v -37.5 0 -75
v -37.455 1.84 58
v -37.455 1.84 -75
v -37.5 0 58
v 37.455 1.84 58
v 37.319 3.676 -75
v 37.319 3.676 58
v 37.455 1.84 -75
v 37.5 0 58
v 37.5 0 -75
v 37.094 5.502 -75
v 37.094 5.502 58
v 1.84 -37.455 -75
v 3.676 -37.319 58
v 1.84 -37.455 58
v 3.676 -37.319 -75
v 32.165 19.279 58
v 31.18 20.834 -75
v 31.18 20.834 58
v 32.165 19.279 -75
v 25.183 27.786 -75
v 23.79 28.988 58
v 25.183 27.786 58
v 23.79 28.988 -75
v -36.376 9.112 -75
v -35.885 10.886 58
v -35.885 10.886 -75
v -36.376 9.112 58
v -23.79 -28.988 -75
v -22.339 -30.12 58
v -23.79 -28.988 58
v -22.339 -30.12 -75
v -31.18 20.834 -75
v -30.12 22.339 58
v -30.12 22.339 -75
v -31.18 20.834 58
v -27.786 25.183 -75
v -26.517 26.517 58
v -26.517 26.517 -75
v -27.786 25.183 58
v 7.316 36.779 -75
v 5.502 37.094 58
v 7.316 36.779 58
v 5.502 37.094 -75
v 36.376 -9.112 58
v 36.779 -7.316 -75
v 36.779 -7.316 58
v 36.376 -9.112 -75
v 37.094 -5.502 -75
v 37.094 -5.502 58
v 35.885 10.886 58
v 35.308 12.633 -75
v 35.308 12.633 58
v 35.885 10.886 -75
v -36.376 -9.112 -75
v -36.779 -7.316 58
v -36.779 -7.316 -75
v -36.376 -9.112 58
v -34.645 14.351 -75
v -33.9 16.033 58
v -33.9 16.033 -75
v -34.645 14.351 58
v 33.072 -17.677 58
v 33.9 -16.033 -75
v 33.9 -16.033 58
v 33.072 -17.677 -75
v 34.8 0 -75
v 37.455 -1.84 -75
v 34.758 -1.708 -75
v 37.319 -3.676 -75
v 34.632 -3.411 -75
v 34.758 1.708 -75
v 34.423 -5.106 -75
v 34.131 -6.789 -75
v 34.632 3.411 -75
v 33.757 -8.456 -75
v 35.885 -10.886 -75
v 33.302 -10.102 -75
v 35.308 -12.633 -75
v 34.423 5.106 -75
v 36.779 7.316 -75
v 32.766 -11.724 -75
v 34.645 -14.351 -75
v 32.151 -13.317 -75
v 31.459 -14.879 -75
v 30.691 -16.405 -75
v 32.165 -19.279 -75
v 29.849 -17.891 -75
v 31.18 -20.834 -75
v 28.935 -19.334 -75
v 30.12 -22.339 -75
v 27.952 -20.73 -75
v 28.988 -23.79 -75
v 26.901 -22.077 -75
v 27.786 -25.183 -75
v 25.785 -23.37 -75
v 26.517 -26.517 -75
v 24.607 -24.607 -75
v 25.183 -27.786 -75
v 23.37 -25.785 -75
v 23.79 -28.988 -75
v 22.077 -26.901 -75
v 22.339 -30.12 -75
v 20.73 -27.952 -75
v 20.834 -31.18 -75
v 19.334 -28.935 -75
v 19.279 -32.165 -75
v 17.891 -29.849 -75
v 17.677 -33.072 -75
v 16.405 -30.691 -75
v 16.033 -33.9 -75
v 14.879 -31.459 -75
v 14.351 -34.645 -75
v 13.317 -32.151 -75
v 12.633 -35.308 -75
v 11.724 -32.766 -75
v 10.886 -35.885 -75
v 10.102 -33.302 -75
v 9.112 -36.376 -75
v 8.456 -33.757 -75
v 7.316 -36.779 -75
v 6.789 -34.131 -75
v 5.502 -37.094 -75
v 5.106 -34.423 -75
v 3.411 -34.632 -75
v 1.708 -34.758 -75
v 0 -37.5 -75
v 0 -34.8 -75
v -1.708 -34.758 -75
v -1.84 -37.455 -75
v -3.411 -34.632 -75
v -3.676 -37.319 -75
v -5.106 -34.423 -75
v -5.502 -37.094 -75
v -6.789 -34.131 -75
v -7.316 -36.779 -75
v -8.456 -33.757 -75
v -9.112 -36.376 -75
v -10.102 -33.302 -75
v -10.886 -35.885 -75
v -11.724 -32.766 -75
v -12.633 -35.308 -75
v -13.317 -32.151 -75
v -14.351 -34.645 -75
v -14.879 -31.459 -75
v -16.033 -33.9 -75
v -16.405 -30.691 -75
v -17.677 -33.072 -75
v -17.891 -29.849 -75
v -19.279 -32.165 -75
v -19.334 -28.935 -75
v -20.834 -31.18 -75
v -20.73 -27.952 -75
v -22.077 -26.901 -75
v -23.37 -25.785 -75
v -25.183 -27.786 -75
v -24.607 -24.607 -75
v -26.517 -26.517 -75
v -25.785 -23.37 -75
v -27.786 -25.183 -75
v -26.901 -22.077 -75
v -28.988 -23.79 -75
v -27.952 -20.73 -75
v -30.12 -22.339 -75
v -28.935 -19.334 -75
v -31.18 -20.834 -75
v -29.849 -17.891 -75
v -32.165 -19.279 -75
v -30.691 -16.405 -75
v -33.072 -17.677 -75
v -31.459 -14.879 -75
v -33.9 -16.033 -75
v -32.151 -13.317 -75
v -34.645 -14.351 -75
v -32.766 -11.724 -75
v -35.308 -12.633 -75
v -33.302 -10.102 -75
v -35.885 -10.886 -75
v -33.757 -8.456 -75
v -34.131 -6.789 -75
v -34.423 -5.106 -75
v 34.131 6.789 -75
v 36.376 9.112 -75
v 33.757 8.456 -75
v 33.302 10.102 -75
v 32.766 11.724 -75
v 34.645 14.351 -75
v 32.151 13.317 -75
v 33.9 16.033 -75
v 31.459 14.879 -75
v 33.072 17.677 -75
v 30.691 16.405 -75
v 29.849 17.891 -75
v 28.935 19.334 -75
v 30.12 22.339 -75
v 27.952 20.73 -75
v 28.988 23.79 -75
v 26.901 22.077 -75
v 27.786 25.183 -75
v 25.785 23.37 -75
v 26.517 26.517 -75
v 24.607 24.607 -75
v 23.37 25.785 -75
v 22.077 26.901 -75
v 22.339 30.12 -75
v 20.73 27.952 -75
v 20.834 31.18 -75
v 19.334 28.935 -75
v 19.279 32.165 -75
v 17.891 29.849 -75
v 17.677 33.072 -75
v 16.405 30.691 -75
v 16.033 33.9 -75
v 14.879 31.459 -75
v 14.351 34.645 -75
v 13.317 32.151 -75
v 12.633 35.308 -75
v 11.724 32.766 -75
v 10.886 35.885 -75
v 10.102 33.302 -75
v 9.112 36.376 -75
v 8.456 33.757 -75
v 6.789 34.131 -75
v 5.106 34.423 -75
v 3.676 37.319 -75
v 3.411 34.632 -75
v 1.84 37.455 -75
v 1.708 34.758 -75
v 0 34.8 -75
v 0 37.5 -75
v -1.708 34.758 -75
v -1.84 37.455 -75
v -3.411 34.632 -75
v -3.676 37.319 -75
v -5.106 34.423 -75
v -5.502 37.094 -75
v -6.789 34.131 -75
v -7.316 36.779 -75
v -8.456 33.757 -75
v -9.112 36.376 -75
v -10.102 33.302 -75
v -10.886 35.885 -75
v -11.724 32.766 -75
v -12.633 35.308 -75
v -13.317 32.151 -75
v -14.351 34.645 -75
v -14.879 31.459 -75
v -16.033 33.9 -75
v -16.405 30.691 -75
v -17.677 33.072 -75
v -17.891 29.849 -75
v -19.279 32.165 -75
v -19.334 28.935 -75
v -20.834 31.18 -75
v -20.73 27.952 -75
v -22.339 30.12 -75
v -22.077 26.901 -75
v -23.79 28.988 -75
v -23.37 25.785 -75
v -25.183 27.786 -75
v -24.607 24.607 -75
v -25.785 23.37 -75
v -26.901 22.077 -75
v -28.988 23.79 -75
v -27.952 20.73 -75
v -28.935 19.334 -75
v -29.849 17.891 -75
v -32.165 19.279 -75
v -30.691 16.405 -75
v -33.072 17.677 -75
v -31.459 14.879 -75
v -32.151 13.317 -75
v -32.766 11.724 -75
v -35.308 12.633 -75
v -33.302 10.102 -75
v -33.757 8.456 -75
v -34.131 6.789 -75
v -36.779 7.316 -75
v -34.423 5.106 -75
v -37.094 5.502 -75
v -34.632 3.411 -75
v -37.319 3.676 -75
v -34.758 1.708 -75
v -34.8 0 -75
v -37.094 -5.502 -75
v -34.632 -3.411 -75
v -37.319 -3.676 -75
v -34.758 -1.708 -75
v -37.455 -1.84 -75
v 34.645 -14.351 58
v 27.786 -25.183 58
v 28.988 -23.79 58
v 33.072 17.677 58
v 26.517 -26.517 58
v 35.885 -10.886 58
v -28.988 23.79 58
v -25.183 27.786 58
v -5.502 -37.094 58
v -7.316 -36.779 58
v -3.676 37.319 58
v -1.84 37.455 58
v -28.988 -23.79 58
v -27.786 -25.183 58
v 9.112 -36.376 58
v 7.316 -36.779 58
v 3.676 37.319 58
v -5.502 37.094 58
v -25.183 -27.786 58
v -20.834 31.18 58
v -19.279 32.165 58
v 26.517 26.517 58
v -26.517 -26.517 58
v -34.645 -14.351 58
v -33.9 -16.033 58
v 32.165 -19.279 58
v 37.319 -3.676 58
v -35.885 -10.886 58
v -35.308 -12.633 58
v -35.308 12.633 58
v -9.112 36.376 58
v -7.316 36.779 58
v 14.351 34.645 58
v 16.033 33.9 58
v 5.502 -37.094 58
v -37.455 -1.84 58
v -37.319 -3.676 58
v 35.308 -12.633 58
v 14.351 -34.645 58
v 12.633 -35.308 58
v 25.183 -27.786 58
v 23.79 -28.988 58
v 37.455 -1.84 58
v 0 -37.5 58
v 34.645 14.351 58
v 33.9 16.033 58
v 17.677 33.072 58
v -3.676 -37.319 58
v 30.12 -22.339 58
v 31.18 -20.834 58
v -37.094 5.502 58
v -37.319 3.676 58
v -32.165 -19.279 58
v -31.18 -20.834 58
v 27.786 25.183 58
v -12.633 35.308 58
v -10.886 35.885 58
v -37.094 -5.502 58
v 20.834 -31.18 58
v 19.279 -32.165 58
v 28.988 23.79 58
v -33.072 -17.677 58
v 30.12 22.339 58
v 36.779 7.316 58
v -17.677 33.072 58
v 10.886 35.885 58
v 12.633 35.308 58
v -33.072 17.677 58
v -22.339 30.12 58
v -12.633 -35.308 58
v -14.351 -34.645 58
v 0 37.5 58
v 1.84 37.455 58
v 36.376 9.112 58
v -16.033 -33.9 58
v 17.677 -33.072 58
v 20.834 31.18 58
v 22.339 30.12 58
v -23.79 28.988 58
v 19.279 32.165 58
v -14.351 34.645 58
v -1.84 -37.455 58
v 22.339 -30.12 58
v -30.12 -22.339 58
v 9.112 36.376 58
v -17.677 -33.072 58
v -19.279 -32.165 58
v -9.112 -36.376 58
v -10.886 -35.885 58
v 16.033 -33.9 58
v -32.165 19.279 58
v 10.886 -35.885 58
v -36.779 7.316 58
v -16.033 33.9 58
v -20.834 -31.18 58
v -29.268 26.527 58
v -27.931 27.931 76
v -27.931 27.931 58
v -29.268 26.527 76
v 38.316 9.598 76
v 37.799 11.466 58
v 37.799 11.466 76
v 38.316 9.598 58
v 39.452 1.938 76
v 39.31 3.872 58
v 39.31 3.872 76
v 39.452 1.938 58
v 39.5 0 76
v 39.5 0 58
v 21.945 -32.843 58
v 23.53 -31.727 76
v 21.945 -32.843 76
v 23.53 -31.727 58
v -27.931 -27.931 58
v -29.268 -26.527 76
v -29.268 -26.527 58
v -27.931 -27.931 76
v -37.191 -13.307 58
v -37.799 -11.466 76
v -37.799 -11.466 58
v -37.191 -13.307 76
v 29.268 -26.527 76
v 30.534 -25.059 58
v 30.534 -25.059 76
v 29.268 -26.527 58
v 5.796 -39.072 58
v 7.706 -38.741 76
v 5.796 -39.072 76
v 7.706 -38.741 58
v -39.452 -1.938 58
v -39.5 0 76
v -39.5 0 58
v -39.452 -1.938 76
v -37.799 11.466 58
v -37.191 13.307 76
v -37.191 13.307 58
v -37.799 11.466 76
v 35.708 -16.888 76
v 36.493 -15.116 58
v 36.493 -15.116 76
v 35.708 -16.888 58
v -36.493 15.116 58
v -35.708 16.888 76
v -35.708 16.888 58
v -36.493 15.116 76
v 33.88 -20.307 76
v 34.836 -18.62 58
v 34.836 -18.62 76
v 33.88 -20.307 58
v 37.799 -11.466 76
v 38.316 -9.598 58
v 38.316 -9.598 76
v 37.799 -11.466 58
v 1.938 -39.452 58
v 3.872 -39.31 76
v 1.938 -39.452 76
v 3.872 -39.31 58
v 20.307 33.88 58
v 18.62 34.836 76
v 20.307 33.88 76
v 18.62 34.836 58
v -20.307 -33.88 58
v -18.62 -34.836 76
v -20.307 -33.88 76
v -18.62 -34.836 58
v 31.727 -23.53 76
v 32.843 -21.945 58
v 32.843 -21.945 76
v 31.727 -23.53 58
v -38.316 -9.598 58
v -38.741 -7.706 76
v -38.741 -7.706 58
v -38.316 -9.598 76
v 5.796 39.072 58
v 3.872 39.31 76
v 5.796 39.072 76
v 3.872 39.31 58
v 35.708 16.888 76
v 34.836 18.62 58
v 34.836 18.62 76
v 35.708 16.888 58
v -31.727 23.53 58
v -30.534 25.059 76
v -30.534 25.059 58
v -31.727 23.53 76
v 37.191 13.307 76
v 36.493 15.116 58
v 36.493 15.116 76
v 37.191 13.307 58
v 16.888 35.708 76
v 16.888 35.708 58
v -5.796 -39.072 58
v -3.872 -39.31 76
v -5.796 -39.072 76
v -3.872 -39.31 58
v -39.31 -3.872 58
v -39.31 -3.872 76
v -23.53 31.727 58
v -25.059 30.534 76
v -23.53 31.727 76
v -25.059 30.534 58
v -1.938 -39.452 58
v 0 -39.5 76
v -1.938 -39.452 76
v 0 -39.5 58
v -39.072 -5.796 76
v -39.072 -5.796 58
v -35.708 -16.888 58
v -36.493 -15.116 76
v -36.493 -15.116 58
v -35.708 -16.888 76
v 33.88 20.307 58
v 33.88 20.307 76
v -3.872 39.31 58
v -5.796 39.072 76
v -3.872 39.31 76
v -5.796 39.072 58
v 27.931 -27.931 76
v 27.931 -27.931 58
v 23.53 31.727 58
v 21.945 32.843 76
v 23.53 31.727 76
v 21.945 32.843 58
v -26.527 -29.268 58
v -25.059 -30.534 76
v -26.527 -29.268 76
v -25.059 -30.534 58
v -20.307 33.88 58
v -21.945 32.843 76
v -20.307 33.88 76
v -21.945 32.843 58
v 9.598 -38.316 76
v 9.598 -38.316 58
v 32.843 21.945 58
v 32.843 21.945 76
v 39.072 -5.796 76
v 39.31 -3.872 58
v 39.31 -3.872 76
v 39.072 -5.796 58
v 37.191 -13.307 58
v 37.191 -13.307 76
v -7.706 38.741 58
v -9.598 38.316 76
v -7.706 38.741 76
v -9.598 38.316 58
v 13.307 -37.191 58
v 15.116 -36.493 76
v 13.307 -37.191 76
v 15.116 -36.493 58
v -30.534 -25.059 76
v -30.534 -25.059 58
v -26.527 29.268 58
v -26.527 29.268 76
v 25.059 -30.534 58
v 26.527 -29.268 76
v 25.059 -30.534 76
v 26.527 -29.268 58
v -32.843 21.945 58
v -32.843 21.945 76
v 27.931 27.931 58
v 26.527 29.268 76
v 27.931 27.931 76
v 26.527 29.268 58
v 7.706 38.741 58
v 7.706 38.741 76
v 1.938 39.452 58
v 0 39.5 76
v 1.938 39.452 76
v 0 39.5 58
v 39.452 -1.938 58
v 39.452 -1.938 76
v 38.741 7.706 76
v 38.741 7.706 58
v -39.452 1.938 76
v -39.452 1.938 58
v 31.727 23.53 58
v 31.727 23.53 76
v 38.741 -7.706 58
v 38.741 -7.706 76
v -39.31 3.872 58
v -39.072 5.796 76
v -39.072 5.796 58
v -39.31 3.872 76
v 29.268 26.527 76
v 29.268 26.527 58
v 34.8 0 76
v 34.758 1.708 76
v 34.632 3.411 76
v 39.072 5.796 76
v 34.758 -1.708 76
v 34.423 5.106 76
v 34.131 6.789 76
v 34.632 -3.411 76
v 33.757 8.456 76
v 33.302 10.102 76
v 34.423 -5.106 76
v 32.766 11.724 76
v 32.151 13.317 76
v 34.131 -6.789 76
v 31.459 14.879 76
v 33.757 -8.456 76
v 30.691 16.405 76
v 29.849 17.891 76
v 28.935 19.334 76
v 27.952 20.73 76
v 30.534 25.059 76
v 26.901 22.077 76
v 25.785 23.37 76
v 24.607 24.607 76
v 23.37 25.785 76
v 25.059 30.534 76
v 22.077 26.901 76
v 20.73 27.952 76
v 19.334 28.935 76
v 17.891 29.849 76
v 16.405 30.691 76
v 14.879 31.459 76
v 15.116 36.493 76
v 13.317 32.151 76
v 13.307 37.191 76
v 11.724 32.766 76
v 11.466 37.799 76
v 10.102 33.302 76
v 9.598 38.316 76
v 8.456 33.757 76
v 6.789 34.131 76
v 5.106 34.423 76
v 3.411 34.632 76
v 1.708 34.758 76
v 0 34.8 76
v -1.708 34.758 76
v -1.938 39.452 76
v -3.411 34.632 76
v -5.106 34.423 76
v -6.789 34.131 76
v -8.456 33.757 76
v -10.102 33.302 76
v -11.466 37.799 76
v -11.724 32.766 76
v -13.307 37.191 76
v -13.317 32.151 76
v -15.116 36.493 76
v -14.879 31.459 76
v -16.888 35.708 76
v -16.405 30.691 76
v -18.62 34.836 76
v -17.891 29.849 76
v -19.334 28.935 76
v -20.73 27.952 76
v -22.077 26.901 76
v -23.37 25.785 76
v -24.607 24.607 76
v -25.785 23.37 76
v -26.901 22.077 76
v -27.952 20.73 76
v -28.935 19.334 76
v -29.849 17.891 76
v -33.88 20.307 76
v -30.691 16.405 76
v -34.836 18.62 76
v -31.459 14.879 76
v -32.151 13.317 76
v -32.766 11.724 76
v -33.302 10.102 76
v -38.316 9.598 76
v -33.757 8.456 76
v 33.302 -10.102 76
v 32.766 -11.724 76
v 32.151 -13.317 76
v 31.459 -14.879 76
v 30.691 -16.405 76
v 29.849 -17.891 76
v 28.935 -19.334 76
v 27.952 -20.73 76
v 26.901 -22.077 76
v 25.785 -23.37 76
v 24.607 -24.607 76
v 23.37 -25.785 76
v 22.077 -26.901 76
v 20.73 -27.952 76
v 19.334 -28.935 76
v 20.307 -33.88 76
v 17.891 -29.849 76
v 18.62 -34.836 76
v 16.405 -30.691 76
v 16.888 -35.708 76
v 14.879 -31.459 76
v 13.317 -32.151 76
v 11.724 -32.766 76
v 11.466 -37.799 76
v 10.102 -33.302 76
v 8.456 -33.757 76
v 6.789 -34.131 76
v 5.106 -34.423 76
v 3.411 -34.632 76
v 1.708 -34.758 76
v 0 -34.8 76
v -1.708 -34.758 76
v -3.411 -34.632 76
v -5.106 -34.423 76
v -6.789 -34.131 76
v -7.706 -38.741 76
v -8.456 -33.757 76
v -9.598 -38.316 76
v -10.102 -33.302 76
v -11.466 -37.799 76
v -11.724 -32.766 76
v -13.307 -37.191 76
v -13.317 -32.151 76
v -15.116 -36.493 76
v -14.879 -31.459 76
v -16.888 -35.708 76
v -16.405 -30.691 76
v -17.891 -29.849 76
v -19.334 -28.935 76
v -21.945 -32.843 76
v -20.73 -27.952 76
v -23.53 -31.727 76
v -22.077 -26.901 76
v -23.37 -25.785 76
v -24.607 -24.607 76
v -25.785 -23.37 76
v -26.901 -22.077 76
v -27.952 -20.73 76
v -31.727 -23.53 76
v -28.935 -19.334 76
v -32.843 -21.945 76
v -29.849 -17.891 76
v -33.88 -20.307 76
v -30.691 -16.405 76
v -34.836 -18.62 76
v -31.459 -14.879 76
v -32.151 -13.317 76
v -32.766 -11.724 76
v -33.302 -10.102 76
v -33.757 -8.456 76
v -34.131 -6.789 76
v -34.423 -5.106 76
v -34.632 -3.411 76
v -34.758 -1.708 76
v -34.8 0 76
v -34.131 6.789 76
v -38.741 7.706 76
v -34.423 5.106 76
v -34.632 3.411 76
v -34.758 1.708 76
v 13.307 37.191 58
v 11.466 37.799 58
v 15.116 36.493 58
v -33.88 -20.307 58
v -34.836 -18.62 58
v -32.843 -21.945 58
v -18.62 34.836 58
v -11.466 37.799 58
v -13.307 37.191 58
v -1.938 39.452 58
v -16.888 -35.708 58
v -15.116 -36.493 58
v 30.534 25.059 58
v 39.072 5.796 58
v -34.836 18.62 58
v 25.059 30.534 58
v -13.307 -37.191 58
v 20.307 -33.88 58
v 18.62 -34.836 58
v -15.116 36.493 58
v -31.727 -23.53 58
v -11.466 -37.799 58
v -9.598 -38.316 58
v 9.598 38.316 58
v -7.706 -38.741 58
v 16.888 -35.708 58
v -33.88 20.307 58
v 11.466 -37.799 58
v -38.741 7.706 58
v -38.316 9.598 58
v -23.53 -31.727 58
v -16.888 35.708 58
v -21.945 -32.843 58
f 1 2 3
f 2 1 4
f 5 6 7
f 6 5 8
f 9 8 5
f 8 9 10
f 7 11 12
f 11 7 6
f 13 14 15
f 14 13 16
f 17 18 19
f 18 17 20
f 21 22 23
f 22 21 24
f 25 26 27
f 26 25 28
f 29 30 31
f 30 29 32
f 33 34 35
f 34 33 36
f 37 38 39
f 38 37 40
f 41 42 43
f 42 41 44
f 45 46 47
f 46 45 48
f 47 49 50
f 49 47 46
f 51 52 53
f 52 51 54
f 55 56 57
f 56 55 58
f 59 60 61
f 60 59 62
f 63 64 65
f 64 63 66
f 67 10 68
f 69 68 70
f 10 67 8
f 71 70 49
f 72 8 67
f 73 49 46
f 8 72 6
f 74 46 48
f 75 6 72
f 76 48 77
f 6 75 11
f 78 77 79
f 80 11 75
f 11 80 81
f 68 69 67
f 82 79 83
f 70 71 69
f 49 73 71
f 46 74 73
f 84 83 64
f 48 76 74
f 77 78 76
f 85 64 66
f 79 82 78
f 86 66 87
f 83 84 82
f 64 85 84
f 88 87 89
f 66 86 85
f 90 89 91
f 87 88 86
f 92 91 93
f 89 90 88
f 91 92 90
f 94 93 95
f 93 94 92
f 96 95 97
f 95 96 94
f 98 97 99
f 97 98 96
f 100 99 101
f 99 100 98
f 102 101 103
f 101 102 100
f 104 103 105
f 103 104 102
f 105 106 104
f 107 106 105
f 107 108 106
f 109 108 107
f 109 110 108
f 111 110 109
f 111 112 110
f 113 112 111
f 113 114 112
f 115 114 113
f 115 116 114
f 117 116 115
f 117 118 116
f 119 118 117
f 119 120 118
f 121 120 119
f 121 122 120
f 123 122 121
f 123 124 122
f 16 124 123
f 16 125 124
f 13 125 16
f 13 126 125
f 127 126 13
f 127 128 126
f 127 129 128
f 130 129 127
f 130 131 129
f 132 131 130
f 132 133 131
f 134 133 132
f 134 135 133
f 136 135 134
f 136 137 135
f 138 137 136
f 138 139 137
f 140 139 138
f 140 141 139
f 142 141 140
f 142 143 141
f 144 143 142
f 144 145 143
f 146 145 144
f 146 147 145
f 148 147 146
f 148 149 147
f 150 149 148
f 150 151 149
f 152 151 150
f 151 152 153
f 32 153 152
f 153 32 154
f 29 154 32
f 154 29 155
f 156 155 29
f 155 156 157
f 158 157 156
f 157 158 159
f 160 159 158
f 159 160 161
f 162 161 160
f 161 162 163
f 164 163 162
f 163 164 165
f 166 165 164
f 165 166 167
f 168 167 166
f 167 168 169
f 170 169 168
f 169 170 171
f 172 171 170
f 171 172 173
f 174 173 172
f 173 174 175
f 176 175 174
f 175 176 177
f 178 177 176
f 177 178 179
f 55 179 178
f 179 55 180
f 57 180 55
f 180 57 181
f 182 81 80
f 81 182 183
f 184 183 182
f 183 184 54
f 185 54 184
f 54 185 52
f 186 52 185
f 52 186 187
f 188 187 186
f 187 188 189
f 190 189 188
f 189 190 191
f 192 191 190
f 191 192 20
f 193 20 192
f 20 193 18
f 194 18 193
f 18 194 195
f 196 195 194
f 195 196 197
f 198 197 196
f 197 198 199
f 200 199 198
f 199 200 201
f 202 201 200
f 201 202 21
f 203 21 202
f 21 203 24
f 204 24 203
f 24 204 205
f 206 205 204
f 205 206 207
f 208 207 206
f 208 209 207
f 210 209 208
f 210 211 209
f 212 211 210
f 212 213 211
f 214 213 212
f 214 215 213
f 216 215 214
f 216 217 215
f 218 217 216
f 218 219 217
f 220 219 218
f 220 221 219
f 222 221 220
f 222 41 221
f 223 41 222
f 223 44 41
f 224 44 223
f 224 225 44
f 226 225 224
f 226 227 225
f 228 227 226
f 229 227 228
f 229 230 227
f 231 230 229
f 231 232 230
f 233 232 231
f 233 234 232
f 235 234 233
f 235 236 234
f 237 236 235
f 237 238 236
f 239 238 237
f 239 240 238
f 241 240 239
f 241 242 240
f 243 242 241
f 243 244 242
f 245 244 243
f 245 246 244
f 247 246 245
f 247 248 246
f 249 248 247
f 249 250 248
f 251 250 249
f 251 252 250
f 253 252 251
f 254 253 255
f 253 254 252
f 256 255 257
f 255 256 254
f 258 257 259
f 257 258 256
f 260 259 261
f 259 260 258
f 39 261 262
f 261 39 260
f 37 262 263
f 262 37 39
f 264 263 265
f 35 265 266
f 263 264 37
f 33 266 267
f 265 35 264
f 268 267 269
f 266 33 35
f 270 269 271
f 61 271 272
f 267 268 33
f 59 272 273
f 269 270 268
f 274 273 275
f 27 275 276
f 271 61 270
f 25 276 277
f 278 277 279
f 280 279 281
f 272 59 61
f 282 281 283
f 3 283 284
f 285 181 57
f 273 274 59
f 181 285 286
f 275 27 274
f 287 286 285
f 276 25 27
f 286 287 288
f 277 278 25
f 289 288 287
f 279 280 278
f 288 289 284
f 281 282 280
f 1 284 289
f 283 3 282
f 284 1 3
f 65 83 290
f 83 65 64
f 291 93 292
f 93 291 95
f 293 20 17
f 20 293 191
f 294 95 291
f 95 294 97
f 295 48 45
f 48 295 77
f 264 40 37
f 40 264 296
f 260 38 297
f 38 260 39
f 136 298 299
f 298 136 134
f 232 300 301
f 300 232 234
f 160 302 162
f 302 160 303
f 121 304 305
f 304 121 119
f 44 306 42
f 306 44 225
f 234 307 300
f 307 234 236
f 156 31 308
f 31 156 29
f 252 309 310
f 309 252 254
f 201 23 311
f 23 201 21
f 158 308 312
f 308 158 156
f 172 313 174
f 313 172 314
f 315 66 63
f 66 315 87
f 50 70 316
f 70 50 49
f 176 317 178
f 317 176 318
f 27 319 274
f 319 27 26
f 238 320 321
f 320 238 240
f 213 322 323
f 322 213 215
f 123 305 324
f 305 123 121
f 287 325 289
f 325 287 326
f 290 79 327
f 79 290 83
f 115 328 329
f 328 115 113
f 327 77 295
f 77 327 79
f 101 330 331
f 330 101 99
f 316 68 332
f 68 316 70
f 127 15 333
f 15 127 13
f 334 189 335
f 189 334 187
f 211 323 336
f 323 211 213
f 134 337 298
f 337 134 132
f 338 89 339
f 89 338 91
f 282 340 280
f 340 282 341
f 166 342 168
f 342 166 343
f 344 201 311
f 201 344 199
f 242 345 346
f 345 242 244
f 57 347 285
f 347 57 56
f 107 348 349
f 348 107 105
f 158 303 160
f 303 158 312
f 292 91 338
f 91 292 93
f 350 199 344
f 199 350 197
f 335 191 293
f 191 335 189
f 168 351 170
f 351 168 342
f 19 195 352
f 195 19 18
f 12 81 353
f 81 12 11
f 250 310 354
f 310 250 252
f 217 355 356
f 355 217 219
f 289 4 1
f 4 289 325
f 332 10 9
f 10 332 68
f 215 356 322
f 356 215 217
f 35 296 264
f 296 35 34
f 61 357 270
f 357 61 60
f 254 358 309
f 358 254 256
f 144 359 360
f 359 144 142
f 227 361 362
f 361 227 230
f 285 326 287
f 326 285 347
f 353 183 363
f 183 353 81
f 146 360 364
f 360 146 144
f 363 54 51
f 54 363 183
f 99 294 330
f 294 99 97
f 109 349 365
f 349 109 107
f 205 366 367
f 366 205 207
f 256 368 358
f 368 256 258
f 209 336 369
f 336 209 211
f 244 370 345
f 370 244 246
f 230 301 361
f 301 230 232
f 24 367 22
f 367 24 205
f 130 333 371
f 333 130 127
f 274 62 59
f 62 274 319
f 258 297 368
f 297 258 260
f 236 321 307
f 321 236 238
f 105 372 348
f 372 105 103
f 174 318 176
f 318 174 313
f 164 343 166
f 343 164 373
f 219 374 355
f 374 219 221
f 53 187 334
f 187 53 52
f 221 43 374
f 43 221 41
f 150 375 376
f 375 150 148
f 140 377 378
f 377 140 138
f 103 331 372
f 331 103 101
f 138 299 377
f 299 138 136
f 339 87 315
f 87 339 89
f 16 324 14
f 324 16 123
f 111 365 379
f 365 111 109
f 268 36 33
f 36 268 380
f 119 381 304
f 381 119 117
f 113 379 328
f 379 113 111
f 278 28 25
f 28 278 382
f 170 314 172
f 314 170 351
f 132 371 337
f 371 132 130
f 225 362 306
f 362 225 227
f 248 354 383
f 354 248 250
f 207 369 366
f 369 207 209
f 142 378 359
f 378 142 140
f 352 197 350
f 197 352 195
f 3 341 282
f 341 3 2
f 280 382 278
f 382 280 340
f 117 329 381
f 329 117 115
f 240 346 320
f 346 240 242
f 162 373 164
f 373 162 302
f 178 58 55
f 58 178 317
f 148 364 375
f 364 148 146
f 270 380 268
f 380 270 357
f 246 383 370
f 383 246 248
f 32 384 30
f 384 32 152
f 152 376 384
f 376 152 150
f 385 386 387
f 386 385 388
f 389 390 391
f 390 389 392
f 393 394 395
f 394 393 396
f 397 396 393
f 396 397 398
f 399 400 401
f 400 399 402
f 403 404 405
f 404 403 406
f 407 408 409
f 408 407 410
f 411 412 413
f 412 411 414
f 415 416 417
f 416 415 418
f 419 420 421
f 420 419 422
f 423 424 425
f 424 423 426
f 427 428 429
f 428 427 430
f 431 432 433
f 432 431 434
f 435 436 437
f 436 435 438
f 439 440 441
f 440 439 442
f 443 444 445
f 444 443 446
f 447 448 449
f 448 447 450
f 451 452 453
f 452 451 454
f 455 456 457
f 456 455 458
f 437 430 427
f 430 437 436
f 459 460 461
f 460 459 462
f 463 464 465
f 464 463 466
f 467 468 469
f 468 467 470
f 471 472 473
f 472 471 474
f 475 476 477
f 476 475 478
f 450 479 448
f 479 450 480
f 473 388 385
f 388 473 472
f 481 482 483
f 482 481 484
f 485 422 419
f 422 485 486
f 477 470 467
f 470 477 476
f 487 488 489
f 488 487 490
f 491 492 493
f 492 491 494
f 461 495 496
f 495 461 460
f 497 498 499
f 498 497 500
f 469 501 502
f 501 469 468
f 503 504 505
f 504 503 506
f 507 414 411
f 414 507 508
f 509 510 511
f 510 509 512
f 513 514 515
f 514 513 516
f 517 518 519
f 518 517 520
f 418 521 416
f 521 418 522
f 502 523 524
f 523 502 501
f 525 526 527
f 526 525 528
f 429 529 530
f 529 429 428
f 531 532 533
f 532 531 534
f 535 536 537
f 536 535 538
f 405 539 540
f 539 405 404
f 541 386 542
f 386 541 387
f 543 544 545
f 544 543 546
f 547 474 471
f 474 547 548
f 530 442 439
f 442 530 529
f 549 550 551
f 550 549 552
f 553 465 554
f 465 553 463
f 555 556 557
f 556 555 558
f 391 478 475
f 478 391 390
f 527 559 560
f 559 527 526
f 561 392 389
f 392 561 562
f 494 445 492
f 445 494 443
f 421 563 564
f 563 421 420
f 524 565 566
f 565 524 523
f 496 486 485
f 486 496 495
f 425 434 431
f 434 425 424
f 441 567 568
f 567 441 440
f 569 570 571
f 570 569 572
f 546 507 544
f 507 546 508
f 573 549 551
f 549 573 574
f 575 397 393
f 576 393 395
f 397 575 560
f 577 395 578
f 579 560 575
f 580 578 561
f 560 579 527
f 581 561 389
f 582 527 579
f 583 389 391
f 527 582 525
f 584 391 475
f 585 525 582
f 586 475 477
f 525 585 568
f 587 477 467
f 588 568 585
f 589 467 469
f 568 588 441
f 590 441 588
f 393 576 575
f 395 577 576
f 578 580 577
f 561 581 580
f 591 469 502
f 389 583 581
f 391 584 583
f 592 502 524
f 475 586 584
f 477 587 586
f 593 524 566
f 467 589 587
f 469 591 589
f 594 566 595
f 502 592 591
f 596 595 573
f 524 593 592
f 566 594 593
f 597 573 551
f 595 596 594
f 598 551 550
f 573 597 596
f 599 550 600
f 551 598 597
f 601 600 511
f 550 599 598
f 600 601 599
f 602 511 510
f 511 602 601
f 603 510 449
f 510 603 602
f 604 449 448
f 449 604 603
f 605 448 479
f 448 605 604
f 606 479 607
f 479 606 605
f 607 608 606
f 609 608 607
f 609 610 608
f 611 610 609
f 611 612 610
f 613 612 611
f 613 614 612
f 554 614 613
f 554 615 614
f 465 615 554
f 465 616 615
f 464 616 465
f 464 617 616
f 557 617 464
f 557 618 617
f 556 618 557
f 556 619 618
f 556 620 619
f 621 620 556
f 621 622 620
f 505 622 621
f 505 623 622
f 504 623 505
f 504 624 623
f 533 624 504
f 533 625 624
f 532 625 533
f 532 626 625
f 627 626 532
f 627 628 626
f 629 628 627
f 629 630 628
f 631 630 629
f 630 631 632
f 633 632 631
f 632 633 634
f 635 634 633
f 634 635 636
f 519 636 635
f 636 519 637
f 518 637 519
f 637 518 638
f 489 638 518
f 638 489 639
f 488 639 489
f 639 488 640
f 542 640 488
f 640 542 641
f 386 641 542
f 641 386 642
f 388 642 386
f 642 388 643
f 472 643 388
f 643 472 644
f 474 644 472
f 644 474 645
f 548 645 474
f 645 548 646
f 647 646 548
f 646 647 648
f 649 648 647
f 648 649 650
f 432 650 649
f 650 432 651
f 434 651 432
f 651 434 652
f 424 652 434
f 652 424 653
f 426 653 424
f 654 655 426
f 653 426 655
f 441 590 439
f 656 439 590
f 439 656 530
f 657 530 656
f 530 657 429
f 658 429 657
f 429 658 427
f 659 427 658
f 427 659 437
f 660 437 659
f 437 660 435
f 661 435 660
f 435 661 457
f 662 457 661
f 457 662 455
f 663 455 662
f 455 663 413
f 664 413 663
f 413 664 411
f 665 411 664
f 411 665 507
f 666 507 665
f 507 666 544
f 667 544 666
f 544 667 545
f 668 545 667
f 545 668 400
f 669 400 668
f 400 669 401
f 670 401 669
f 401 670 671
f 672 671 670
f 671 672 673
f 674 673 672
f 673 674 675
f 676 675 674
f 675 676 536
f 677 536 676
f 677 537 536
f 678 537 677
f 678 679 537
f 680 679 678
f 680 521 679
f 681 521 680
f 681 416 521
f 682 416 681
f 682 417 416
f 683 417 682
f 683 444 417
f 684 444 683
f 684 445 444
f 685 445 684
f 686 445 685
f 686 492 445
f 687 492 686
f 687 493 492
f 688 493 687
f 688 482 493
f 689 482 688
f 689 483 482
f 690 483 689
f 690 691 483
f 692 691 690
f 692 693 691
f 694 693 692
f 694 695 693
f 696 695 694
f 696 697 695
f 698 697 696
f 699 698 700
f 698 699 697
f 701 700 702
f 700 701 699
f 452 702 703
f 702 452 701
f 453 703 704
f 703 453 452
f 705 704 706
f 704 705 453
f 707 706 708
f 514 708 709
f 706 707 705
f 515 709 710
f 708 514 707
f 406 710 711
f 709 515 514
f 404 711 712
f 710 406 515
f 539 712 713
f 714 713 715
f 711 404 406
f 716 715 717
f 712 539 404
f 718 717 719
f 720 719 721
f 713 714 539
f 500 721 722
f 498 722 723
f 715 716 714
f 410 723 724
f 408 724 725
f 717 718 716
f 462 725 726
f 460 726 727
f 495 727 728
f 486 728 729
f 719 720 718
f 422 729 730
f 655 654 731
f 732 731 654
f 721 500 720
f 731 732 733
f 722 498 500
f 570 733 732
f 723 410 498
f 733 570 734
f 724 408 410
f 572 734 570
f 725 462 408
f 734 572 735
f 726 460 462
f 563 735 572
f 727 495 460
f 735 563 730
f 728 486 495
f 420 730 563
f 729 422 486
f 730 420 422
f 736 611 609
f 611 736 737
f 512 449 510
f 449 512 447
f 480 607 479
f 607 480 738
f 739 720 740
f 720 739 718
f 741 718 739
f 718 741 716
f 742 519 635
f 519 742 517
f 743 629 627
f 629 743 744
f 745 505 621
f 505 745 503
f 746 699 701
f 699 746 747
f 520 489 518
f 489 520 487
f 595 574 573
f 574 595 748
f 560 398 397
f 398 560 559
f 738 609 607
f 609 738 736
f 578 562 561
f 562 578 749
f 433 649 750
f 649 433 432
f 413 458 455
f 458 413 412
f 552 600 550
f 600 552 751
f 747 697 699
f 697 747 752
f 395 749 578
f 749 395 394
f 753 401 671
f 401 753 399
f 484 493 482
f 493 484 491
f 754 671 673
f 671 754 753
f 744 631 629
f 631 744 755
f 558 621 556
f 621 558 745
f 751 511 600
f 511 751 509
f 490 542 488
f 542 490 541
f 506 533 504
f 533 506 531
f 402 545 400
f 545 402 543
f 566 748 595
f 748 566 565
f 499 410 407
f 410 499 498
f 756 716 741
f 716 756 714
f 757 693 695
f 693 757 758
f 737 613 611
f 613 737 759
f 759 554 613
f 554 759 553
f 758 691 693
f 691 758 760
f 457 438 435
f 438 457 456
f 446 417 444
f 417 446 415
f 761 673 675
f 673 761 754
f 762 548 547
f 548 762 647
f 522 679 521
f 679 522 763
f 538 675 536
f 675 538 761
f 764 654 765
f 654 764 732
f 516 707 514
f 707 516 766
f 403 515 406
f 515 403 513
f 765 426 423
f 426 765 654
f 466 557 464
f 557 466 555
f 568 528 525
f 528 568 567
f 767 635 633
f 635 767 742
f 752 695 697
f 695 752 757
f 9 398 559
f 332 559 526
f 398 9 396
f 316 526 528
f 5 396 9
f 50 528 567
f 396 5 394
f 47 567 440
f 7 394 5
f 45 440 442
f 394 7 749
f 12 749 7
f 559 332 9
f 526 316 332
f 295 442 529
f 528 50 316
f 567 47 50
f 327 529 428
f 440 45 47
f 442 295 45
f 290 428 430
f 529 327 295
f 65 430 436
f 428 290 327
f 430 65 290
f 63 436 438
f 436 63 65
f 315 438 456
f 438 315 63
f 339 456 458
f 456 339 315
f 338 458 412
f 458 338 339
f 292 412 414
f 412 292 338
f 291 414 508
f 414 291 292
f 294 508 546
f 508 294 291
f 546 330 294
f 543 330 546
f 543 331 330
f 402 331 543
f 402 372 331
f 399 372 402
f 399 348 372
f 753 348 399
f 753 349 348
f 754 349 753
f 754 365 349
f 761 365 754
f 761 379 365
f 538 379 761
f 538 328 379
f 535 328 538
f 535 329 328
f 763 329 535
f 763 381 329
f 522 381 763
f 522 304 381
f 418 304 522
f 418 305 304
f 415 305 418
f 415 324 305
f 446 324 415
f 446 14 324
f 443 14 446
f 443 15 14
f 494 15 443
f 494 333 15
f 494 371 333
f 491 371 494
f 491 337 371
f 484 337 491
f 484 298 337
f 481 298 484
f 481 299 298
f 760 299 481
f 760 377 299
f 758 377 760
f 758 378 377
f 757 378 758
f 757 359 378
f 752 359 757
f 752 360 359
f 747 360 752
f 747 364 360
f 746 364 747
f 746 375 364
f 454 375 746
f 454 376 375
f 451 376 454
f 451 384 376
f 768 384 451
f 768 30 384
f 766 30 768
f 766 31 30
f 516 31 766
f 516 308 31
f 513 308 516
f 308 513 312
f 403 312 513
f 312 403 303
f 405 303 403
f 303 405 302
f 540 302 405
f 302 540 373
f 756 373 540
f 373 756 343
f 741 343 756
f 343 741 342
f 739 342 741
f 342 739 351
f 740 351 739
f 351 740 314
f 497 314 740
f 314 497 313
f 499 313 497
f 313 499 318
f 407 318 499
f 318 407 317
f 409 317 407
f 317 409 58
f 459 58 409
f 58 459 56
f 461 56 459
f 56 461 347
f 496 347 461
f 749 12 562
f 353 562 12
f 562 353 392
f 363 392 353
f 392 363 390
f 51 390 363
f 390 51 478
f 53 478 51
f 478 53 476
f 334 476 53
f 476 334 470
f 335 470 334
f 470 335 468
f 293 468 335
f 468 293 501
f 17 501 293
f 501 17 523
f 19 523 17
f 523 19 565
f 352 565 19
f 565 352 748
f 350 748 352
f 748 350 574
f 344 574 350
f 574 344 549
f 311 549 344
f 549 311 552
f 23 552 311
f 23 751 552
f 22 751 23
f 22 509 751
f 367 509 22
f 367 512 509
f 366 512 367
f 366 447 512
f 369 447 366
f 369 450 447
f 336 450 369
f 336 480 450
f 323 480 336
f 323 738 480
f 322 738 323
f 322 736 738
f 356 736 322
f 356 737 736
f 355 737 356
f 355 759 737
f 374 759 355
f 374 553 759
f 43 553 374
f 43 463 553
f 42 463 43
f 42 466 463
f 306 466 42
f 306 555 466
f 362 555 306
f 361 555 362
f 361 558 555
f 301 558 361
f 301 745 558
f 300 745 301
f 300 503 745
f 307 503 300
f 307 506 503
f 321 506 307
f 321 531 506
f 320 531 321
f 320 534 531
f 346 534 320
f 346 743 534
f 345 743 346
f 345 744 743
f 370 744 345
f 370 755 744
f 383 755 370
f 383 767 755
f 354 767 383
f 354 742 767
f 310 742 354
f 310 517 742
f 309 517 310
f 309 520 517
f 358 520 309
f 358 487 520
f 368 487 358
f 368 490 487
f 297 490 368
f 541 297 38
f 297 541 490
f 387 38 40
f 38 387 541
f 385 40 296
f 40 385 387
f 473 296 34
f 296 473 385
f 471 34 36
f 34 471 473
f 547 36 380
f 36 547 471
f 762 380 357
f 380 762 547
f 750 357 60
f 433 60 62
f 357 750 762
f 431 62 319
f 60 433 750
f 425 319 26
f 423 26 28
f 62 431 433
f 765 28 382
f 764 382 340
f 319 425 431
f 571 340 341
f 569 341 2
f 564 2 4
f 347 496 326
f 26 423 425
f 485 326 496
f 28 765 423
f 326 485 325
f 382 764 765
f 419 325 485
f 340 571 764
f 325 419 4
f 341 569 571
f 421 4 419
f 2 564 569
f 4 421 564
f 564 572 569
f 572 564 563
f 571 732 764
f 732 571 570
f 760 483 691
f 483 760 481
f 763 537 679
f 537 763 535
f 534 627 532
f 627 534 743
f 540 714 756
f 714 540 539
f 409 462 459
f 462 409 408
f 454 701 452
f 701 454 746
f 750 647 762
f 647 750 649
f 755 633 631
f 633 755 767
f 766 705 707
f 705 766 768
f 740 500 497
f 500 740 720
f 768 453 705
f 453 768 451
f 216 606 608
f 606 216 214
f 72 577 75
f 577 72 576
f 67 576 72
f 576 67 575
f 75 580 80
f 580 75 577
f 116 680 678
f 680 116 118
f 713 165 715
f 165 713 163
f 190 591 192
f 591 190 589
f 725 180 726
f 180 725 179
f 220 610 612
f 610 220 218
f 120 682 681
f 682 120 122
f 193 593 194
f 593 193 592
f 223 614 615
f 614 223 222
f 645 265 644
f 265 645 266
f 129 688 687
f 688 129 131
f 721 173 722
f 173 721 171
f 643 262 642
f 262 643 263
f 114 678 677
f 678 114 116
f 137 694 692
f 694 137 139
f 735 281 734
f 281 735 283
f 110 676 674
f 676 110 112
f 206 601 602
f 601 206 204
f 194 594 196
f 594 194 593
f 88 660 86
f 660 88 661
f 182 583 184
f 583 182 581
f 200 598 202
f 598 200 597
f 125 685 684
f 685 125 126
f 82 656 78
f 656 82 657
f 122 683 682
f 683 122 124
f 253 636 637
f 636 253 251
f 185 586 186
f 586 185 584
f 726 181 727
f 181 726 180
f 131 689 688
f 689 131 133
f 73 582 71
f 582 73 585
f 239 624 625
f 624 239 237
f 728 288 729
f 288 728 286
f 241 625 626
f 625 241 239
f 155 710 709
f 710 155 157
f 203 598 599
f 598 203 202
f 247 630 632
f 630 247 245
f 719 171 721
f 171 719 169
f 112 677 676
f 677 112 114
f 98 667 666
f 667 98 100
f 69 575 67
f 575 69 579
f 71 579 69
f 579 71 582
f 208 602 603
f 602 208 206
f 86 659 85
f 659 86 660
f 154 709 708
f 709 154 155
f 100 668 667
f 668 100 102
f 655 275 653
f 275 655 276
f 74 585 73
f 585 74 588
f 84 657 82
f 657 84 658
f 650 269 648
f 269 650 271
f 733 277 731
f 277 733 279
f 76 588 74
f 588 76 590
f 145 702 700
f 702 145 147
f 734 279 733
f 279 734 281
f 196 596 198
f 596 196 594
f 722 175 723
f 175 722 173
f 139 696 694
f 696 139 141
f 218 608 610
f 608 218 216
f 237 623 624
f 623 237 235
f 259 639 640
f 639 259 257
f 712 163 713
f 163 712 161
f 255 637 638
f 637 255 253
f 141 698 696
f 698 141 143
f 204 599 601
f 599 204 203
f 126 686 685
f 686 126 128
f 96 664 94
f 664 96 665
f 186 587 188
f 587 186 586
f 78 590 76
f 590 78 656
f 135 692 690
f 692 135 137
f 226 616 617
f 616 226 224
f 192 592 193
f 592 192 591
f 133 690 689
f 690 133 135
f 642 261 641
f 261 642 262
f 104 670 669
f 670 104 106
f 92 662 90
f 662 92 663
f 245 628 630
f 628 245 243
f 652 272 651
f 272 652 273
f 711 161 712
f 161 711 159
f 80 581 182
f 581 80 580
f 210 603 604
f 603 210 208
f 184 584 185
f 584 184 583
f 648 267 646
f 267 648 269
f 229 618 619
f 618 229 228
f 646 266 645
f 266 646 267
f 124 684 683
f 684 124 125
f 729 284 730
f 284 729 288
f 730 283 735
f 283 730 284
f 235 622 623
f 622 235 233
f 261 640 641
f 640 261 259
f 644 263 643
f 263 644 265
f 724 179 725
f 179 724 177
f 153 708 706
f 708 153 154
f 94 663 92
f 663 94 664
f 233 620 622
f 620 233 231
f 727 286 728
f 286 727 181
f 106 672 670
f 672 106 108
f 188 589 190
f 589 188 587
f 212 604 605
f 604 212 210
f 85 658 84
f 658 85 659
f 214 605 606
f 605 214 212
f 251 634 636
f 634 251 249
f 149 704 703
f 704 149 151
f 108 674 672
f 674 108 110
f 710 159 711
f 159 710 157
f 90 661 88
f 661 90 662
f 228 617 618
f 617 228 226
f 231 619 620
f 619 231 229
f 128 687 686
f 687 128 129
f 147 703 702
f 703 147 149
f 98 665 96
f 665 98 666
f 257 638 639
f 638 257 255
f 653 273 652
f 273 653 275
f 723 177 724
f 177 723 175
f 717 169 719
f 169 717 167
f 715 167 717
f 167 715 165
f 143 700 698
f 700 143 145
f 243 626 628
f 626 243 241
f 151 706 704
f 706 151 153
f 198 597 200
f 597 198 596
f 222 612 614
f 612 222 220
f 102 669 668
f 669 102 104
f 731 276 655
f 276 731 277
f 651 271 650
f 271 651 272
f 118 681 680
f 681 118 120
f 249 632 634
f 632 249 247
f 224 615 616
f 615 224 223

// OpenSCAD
// HT 75 pipe, length 150 mm (single connected solid)

// Parameters
nominal_size = 75; //[40:160:1]
length_mm = 150; //[75:300:1]
ht75_outer_diameter = 75; //[60:90:0.5]
ht75_wall_thickness = 2.7; //[1.5:5.5:0.1]
interface_ring_length = 18; //[8:40:1]
interface_ring_radial_thickness = 2.0; //[0.8:6.0:0.1]
overlap = 1.0; //[0.5:2.0:0.1]

$fn = 128;

module ht_pipe() {
    outer_r = ht75_outer_diameter/2;
    inner_r = outer_r - ht75_wall_thickness;
    inner_r_safe = max(0.01, inner_r);

    // Place ring at one end, overlapping into the main pipe so it's connected
    ring_center_z = (length_mm/2) - (interface_ring_length/2) + overlap;

    color([0.85, 0.85, 0.8])
    difference() {
        // Outer solid: main pipe + outer ring (connected via overlap)
        union() {
            cylinder(h=length_mm, r=outer_r, center=true);

            translate([0, 0, ring_center_z])
                cylinder(h=interface_ring_length, r=outer_r + interface_ring_radial_thickness, center=true);
        }

        // Inner bore: remove through entire length including ring
        cylinder(h=length_mm + interface_ring_length + 6*overlap, r=inner_r_safe, center=true);
    }
}

ht_pipe();
